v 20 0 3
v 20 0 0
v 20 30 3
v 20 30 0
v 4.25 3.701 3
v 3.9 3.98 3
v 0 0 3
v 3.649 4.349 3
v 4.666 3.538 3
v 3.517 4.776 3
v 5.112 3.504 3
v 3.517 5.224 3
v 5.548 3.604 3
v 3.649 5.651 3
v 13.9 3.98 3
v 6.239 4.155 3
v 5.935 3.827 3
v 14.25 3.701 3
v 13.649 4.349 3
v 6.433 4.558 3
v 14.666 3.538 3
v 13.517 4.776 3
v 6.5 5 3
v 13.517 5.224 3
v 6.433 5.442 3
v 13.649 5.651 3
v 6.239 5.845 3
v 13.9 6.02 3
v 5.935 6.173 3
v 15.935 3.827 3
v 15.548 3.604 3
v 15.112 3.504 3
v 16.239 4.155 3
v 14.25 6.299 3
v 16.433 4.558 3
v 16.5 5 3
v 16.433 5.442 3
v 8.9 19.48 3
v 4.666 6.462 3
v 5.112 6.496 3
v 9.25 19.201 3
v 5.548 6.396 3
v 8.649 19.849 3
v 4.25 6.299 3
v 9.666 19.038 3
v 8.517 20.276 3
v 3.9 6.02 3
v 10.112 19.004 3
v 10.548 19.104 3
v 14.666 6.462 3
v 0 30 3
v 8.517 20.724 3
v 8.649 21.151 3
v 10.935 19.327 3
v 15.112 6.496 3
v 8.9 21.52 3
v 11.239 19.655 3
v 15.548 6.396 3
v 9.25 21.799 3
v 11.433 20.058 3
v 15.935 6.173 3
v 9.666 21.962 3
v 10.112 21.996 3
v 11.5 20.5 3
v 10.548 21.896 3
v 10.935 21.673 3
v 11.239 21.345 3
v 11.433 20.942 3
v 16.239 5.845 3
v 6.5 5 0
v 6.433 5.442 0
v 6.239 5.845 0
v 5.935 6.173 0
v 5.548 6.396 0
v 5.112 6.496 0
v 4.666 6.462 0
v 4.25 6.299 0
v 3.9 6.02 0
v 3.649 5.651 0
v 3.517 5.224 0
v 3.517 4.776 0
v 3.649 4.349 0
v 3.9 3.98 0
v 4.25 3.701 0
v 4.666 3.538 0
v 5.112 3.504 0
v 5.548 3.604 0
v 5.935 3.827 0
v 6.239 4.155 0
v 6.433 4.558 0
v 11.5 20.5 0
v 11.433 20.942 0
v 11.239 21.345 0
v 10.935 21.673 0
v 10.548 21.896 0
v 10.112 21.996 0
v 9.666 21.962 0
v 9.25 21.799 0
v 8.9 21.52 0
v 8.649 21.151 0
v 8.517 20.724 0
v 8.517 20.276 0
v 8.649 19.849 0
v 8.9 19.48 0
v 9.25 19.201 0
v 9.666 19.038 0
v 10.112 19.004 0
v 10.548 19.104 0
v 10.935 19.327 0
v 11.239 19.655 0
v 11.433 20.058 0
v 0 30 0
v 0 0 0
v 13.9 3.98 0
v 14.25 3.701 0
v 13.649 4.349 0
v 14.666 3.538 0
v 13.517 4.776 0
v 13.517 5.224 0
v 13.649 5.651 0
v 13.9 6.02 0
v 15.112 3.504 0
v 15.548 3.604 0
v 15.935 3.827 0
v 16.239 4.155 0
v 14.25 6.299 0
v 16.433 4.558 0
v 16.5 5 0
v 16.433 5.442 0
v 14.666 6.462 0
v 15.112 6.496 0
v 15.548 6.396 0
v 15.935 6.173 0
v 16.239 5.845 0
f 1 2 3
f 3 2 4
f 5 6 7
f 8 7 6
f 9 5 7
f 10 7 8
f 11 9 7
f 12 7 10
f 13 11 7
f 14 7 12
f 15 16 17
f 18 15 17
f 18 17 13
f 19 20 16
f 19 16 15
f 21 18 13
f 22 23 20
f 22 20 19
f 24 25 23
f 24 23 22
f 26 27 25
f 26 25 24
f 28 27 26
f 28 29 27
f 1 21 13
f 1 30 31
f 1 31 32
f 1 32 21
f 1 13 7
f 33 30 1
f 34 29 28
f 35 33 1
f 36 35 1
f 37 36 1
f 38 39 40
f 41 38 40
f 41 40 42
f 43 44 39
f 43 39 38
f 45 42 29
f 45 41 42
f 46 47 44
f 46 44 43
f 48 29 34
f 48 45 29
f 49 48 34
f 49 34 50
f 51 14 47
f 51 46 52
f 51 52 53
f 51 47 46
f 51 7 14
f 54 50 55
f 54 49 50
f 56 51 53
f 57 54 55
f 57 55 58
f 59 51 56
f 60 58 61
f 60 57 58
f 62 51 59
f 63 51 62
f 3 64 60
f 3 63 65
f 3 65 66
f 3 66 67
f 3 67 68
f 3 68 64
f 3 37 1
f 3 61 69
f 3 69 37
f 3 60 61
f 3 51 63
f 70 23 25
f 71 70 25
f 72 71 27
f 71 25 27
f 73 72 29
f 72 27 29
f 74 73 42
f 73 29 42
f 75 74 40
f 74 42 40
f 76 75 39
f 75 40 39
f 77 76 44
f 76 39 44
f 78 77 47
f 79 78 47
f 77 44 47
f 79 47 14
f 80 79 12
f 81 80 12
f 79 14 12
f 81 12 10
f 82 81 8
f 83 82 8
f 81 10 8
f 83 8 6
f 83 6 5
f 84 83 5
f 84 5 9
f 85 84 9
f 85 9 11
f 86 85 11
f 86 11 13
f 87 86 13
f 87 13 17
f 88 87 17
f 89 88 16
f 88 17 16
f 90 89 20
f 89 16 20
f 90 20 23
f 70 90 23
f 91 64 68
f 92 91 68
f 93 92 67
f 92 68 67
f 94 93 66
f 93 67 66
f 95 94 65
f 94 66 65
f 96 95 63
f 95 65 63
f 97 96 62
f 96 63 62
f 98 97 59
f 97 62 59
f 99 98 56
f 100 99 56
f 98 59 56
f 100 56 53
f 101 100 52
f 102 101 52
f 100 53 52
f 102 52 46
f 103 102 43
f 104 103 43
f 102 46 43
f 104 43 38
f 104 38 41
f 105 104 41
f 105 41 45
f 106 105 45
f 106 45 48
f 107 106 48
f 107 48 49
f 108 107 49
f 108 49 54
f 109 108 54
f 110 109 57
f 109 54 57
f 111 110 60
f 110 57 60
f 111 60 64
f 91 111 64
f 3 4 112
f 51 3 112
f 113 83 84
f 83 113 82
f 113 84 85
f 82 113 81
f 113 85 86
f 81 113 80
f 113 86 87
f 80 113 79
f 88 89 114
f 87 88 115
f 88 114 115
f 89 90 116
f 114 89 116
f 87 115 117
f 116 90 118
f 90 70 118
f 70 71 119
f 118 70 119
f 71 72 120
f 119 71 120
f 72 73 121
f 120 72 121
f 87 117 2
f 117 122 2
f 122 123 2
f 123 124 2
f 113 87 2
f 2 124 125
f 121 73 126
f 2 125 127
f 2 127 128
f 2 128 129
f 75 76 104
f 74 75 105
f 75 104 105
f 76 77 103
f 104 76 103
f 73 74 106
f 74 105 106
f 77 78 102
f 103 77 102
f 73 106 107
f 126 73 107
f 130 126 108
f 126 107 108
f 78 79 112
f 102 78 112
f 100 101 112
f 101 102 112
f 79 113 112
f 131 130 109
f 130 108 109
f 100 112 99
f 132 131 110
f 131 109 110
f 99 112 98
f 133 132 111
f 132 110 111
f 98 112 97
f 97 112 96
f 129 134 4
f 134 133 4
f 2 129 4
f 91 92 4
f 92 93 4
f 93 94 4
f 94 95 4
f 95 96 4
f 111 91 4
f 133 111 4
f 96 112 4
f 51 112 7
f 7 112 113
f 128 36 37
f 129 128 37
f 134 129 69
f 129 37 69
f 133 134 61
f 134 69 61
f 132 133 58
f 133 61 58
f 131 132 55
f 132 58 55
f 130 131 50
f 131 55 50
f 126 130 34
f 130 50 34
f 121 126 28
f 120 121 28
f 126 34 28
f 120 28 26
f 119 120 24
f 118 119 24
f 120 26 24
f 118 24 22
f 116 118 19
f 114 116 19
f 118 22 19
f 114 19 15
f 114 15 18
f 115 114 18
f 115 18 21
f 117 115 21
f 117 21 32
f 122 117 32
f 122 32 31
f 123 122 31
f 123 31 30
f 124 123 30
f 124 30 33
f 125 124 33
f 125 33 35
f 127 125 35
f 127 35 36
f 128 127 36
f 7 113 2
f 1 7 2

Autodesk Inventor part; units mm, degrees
ref_plane "YZ Plane" through (0, 0, 0) normal (1, 0, 0) x (0, 1, 0)
ref_plane "XZ Plane" through (0, 0, 0) normal (0, 1, 0) x (-1, 0, 0)
ref_plane "XY Plane" through (0, 0, 0) normal (0, 0, 1) x (1, 0, 0)
sketch "Sketch1" plane through (0, 0, 0) normal (0, 0, 1) x (1, 0, 0)
  line L0 (0, 0) -> (20, 0)
  line L1 (20, 0) -> (20, 30)
  line L2 (20, 30) -> (0, 30)
  line L3 (0, 30) -> (0, 0)
  dimension "d0" = 20
  dimension "d1" = 30
extrude "Extrusion1" add sketch "Sketch1" along normal blind 3
sketch "Sketch2" plane through (0, 0, 3) normal (0, 0, 1) x (1, 0, 0)
  line L0 (0, 0) -> (20, 0) projected
  line L1 (20, 0) -> (20, 30) projected
  line L2 (20, 30) -> (0, 30) projected
  line L3 (0, 30) -> (0, 0) projected
  line L4 (0, 5) -> (20, 5)
  line L5 (10, 0) -> (10, 30)
  circle A0 centre (5, 5) radius 1.5
  circle A1 centre (15, 5) radius 1.5
  dimension "d4" = 3
  dimension "d5" = 10
  dimension "d6" = 10
extrude "Extrusion2" cut sketch "Sketch2" against normal blind 3 contours A0 L4 | L4 A0 | A1 L4 | L4 A1
sketch "Sketch4" plane through (0, 0, 3) normal (0, 0, 1) x (1, 0, 0)
  line L0 (0, 0) -> (20, 0) projected
  line L1 (20, 30) -> (0, 30) projected
  line L2 (10, 30) -> (10, 0)
  circle A0 centre (10, 20.5) radius 1.5
  dimension "d13" = 3
  dimension "d14" = 9.5
extrude "Extrusion4" cut sketch "Sketch4" against normal blind 3
properties part number "limit-holders"
